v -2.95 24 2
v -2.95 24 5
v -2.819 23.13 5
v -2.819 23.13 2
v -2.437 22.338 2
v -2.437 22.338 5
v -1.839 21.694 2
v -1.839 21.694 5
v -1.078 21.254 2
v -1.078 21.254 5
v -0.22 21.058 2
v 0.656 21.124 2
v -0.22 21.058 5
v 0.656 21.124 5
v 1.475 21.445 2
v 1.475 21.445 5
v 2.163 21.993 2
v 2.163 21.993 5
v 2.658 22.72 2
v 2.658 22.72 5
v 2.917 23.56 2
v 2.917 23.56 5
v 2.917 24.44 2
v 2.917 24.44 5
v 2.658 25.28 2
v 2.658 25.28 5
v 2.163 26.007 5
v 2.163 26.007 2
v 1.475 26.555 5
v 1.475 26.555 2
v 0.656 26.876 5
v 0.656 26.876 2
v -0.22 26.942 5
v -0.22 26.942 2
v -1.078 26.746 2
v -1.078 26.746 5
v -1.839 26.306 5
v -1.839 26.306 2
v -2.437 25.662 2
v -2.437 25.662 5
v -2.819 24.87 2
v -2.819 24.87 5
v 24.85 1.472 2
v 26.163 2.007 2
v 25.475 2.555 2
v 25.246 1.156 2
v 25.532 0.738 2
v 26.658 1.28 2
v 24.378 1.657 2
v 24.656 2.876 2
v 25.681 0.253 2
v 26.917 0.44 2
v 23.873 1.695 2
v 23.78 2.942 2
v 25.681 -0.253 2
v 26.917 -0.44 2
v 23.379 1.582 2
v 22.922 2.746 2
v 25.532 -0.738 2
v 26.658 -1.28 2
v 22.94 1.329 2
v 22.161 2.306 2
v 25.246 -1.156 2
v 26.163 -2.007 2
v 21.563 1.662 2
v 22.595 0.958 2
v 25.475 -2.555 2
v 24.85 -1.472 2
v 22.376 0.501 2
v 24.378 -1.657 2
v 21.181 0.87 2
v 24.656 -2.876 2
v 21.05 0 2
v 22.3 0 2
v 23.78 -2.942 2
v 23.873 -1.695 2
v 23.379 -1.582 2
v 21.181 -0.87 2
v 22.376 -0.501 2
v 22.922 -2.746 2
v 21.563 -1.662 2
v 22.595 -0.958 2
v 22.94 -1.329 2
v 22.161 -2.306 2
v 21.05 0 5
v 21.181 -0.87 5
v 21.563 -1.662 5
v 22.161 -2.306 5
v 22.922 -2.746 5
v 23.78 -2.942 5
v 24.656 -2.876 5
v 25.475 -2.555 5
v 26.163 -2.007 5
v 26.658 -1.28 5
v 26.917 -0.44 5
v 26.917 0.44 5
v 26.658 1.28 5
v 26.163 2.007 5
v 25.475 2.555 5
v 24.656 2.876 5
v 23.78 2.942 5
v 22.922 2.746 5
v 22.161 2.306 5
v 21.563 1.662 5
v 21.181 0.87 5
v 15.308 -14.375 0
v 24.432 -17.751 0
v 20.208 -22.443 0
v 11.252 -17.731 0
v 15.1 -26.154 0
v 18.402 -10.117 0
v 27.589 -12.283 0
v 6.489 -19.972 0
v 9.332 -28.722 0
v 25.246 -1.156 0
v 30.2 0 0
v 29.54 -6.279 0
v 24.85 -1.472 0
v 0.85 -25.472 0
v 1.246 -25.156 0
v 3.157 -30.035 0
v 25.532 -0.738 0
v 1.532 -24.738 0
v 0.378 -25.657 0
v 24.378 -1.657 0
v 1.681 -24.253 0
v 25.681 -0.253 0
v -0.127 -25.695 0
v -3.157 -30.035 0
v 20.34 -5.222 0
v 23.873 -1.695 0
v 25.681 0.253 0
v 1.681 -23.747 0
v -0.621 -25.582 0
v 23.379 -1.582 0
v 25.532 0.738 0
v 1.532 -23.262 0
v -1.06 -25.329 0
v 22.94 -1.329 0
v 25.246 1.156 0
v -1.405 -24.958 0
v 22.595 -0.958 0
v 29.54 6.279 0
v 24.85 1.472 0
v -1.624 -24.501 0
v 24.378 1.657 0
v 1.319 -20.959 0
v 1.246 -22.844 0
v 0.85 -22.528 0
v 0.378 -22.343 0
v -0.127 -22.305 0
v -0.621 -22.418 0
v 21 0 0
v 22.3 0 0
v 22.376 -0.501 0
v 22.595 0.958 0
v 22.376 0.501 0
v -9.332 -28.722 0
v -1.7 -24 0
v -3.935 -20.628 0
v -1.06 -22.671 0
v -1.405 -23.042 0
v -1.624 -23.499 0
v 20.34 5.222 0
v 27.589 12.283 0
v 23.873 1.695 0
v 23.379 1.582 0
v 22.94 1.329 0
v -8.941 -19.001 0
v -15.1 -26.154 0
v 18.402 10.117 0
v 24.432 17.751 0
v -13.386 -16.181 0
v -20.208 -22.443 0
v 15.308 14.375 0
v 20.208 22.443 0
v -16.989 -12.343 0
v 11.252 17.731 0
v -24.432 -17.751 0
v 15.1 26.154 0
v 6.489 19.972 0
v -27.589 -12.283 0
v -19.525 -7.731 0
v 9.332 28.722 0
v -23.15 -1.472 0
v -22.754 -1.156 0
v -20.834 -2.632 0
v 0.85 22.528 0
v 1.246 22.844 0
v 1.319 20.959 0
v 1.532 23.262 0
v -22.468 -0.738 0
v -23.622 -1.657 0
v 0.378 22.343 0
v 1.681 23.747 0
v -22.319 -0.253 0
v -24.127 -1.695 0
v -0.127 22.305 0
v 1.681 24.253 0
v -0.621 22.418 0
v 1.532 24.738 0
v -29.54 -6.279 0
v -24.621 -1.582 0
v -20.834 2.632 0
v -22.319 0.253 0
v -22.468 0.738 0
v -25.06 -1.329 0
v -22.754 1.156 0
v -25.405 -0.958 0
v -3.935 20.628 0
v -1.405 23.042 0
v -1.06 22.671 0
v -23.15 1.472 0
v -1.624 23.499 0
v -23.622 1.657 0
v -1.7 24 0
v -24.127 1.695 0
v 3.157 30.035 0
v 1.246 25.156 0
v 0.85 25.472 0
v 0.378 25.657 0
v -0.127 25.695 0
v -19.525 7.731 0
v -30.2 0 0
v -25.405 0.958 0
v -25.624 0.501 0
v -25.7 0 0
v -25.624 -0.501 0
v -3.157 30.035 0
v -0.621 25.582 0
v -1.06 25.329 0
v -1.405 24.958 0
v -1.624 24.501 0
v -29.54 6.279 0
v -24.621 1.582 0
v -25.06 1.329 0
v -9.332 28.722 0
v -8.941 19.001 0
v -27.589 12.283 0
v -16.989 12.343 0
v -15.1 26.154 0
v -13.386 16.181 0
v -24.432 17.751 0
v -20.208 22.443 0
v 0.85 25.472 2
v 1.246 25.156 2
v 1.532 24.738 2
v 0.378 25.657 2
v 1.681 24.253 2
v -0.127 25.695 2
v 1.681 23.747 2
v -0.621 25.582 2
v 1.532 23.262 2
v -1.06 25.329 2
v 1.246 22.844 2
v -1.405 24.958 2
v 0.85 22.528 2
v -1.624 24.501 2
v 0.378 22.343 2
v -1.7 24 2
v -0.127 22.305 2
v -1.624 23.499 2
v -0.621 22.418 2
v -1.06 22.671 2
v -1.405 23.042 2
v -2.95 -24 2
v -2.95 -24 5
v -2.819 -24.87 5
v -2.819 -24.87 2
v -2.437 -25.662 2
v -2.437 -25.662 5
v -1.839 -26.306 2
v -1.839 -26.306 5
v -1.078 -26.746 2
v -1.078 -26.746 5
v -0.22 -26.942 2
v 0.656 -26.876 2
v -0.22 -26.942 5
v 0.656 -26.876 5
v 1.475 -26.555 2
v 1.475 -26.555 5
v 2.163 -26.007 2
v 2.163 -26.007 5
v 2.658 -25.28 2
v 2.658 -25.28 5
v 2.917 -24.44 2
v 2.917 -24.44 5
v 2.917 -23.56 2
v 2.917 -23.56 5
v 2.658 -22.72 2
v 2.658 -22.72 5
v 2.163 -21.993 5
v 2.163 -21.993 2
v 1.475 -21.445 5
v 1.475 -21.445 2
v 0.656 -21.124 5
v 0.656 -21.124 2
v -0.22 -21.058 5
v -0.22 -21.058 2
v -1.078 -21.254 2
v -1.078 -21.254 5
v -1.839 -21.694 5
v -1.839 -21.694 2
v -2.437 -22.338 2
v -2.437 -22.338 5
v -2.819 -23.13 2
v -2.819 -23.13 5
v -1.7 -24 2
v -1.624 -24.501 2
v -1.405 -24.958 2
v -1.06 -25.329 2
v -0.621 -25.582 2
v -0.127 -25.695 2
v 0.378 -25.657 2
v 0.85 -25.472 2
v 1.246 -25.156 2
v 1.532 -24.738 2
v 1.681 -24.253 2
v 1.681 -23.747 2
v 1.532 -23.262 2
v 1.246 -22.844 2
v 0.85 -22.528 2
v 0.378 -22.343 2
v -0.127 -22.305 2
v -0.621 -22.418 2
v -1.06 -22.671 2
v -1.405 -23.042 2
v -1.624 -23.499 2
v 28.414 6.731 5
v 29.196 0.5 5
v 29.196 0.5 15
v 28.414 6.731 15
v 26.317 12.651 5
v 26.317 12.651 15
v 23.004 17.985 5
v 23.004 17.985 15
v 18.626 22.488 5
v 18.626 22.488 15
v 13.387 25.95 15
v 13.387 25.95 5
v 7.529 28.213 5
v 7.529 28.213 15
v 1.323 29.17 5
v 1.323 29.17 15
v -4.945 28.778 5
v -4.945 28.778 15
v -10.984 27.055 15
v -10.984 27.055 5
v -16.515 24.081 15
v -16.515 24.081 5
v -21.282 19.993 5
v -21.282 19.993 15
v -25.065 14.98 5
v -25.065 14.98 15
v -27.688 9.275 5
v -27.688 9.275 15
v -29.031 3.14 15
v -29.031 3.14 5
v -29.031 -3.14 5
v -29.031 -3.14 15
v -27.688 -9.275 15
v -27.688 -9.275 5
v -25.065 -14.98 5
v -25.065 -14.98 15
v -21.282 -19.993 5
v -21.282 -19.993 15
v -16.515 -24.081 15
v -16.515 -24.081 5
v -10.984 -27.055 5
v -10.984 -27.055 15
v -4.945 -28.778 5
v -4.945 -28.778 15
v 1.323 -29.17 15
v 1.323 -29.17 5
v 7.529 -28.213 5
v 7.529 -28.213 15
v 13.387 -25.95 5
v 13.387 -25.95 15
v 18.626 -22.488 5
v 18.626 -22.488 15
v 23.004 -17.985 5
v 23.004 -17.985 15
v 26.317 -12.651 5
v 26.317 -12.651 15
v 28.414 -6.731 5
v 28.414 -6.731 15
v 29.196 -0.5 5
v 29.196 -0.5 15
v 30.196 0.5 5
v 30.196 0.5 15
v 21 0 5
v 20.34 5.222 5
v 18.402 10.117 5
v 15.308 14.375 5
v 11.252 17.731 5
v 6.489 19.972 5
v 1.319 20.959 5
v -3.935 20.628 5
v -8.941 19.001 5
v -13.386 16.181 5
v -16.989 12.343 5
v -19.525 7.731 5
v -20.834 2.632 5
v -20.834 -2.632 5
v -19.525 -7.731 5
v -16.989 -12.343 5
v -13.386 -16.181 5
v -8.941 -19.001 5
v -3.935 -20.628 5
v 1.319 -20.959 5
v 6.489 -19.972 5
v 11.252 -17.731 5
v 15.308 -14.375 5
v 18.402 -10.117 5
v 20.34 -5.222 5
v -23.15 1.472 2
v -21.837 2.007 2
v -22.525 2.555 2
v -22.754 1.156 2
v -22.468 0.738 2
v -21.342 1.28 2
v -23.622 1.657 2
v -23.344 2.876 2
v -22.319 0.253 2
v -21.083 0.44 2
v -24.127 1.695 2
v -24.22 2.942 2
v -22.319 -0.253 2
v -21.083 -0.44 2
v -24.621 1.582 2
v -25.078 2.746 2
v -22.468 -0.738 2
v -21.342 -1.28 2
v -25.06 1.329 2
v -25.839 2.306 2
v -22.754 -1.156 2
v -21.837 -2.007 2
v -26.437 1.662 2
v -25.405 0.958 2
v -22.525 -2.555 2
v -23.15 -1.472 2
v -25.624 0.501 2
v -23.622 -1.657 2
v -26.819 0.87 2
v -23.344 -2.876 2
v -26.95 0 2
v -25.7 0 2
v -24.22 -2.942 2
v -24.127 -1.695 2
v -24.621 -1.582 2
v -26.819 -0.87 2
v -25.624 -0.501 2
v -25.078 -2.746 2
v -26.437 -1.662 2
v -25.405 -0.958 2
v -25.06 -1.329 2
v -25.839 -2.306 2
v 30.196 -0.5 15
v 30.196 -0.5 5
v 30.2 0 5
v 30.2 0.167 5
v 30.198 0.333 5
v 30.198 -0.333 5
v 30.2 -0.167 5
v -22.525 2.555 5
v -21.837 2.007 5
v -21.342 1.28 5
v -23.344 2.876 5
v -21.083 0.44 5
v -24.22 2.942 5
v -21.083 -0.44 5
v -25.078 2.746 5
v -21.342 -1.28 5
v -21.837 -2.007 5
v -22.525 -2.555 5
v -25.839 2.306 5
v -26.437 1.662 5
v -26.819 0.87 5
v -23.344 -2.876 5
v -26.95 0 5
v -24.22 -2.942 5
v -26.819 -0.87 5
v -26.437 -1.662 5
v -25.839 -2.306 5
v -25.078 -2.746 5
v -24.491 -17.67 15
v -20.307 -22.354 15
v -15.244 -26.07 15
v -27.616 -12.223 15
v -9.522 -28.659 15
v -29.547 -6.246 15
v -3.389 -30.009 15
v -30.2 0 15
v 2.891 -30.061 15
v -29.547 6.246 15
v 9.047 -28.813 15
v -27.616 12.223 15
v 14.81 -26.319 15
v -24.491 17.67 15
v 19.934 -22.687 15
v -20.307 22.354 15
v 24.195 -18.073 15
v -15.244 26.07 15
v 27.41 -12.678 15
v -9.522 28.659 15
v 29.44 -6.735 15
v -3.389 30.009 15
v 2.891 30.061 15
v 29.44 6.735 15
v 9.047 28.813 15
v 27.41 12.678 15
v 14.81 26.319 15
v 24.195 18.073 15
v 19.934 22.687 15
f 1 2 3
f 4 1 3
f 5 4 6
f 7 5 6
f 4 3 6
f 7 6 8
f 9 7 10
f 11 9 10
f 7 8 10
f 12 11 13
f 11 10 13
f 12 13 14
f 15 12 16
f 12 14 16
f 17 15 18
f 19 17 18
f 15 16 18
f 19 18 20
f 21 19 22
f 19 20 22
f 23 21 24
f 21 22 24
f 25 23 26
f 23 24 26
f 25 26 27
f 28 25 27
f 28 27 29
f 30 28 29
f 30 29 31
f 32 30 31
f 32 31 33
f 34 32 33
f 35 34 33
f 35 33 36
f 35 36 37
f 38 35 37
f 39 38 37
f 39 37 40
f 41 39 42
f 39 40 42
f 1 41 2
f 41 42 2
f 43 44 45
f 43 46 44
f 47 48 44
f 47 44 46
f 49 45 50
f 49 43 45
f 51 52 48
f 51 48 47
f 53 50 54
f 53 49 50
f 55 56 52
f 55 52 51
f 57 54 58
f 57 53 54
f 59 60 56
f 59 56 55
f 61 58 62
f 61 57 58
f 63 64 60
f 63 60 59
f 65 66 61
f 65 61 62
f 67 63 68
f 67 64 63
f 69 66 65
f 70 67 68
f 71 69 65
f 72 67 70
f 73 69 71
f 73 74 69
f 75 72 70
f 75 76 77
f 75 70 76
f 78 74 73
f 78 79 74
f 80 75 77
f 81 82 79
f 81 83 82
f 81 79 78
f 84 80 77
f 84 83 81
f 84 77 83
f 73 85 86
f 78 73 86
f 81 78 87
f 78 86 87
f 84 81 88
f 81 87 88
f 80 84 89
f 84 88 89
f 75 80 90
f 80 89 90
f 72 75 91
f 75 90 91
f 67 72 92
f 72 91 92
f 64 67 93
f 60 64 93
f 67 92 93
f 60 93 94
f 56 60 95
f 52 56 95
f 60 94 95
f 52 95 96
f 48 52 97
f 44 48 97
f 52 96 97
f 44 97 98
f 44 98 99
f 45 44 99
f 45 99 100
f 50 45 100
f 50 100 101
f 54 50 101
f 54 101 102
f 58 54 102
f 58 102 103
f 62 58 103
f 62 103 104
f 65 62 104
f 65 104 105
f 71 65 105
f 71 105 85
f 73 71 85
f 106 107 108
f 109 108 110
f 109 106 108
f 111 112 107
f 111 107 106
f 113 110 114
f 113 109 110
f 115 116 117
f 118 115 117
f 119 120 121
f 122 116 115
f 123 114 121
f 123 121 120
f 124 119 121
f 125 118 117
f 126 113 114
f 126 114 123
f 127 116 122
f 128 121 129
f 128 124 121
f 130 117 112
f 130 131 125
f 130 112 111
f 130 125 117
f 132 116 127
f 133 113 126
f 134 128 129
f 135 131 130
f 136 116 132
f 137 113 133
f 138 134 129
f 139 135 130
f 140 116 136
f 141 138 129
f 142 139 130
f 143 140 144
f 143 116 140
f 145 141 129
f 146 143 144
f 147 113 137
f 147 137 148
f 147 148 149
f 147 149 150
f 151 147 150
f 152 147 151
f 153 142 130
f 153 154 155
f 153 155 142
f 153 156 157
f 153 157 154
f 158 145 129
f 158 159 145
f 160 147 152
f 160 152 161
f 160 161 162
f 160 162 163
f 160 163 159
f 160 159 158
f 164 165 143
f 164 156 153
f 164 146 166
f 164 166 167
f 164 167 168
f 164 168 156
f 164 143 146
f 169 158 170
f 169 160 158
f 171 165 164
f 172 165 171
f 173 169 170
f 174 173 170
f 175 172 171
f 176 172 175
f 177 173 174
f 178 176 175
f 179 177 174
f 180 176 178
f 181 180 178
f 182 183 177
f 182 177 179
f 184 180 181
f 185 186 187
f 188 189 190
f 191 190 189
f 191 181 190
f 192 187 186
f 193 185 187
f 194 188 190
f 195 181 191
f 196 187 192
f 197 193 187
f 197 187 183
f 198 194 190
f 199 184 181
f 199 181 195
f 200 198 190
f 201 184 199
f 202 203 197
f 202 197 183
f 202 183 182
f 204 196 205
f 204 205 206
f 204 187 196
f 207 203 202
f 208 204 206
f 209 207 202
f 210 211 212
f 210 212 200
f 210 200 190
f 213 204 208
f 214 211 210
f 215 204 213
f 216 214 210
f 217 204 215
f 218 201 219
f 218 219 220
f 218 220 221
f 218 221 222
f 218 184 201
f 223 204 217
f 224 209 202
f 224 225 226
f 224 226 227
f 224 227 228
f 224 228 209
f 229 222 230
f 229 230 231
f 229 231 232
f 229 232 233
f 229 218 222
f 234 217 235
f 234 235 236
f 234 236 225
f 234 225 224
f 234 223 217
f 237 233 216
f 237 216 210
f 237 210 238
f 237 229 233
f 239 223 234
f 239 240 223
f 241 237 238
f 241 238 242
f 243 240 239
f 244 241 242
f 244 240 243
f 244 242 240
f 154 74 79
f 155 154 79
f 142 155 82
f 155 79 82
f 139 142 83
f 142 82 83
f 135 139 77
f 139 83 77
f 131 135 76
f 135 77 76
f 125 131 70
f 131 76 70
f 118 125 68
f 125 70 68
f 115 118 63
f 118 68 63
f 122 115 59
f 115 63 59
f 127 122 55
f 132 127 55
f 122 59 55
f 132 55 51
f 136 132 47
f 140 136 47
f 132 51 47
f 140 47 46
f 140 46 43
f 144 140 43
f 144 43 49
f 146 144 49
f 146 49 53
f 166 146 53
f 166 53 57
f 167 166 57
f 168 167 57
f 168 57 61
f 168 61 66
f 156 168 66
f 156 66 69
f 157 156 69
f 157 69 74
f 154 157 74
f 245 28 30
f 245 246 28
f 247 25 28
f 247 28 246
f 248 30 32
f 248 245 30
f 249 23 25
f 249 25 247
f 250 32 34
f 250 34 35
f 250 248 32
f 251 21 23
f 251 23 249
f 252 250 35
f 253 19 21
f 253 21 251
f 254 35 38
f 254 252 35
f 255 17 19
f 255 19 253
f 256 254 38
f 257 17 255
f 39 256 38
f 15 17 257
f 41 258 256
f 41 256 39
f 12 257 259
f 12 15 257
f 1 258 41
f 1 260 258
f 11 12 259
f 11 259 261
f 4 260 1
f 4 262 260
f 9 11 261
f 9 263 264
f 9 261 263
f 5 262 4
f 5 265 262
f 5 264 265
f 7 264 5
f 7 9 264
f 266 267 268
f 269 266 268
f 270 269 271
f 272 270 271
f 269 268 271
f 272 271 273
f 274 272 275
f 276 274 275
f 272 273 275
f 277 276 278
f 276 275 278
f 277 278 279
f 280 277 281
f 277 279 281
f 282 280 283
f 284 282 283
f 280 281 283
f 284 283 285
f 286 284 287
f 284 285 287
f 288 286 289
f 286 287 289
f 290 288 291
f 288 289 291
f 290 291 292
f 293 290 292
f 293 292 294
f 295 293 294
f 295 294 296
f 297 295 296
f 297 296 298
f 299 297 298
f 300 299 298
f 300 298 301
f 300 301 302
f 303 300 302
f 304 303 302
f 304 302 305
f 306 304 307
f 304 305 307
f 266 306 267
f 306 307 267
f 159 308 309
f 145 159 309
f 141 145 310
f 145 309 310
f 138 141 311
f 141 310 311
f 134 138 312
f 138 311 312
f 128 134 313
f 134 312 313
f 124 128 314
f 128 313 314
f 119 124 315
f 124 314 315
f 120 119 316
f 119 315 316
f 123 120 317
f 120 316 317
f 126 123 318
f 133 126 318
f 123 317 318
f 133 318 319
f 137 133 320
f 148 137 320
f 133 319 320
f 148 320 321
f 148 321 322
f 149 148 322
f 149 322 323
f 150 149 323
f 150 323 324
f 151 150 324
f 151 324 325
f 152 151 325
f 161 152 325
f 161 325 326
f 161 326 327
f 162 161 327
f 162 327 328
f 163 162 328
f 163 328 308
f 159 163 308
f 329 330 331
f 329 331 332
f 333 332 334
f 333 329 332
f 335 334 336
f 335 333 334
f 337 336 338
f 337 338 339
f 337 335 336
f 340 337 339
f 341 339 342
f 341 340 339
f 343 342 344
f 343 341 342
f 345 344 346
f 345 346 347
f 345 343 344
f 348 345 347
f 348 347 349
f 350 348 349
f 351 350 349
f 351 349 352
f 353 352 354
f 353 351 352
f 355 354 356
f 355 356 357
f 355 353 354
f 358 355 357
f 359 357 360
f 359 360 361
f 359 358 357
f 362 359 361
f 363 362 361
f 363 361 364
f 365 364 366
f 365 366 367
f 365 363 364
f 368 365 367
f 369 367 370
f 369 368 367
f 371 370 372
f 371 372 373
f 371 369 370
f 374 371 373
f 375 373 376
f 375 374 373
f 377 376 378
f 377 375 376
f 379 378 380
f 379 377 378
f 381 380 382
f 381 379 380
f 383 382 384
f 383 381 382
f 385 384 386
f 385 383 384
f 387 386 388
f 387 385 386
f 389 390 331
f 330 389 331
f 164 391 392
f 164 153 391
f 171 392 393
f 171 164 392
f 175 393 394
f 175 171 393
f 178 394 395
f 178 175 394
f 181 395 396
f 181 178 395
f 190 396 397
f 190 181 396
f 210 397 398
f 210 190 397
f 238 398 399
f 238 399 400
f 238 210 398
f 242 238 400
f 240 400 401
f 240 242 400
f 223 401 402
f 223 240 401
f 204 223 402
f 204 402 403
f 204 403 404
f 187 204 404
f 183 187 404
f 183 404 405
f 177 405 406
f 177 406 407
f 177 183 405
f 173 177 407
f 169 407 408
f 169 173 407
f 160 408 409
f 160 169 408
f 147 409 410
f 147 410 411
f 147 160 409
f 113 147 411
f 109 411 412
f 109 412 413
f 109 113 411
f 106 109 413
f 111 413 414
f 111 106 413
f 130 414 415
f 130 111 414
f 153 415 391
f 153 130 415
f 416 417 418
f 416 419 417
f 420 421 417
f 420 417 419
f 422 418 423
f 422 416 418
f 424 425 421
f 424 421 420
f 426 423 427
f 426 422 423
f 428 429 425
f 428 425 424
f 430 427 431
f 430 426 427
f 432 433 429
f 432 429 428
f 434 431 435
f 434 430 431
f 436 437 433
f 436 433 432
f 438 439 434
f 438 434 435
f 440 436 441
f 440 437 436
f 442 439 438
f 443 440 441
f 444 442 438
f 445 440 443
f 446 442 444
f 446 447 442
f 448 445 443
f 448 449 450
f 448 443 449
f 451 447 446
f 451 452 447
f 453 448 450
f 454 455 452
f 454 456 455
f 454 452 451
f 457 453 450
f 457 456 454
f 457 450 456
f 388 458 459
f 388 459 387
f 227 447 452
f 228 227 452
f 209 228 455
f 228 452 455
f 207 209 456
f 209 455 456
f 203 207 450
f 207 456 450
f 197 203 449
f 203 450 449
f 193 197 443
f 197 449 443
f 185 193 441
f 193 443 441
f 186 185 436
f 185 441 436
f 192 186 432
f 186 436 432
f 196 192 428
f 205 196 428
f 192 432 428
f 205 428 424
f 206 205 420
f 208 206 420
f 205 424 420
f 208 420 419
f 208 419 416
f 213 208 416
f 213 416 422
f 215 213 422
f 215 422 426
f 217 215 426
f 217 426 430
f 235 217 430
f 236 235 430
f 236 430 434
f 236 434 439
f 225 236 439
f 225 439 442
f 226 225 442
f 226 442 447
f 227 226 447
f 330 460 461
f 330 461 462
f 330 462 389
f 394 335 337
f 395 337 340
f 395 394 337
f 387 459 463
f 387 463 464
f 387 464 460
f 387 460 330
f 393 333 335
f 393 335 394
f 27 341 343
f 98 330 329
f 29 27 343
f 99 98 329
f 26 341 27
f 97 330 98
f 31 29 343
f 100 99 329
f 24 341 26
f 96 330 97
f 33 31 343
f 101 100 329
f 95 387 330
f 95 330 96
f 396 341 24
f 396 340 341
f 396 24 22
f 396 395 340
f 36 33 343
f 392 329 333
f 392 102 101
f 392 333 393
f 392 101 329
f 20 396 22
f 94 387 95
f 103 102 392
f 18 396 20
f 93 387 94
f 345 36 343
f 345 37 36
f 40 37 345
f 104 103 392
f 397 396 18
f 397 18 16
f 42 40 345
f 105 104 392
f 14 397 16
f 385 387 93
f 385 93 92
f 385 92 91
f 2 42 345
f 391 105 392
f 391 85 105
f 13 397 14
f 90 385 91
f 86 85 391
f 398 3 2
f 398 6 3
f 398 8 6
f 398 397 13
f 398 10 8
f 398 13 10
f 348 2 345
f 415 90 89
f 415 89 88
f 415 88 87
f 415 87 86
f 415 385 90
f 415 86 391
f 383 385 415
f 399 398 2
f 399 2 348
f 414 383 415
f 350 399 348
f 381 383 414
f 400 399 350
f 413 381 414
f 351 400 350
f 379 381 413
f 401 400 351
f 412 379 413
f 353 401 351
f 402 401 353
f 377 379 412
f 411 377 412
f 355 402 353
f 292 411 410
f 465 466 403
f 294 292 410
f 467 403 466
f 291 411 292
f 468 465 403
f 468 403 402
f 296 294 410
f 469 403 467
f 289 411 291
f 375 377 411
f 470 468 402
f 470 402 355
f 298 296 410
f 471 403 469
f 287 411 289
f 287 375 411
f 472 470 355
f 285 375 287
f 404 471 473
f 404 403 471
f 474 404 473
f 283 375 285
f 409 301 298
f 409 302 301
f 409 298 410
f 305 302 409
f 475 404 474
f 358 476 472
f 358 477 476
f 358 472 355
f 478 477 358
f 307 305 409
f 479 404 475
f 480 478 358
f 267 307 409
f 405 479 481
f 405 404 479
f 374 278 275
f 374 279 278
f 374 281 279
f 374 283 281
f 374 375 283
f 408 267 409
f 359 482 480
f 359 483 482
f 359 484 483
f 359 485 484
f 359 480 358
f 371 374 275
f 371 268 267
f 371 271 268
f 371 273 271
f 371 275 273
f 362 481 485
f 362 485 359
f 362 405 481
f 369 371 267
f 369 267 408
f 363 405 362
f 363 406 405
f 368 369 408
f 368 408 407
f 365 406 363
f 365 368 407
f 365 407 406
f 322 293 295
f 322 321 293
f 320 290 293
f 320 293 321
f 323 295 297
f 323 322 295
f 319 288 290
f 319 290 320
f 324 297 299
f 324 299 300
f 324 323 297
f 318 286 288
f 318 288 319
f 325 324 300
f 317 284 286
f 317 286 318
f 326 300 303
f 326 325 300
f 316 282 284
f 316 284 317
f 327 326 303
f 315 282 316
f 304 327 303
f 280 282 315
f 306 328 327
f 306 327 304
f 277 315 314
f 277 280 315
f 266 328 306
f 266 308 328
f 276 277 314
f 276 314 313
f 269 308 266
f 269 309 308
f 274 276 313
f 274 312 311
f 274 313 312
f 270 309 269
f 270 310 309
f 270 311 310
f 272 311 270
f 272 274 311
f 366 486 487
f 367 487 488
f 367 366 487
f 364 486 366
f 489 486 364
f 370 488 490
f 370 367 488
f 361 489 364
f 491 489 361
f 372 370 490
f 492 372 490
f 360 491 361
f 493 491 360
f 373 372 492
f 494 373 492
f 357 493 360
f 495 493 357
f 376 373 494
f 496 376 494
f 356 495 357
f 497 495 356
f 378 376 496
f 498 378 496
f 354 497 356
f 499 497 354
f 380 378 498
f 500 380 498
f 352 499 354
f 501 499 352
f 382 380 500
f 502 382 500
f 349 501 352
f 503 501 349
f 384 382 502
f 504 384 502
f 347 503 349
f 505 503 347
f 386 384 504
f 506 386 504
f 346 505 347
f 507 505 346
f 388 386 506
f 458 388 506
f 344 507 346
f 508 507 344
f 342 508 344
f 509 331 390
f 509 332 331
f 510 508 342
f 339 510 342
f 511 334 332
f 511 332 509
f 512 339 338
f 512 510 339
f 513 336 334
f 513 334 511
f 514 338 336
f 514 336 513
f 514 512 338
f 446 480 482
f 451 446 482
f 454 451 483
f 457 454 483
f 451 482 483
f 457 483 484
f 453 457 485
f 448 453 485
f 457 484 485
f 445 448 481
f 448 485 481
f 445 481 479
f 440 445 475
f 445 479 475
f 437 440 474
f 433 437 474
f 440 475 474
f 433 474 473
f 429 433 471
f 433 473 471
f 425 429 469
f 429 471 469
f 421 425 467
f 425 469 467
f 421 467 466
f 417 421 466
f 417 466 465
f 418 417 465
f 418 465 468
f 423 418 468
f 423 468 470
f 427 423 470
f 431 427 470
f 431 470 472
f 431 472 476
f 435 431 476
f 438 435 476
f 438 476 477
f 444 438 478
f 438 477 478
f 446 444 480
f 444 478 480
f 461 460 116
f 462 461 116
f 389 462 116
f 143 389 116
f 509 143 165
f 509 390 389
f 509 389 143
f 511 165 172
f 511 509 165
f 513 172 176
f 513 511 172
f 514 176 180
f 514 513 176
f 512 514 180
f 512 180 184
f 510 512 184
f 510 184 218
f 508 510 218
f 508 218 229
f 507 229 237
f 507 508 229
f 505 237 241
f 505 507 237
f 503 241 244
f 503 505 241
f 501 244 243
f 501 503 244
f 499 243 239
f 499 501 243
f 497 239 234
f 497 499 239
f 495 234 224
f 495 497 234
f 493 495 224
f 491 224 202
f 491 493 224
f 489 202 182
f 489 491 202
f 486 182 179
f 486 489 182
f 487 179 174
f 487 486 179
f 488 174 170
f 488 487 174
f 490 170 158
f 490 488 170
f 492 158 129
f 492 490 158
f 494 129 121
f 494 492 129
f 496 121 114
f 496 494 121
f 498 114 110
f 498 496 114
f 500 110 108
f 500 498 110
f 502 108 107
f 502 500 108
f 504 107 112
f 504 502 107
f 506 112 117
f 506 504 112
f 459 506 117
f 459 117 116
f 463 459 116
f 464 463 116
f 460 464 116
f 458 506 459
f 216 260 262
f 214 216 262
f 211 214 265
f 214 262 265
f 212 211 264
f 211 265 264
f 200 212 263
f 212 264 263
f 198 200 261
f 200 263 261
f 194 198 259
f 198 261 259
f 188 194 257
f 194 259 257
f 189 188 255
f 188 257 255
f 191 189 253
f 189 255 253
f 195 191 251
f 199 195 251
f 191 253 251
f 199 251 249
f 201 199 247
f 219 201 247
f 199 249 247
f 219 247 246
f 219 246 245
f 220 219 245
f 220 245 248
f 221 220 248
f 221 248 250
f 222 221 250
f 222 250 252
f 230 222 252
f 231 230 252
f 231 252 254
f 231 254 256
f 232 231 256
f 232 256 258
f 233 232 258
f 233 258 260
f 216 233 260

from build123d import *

# Parameters (mm, degrees)
SKETCH001_R     = 1.7
POCKET_DEPTH    = 5.001
SKETCH002_R     = 2.95
POCKET001_DEPTH = 3
SKETCH003_W     = 10
SKETCH003_H     = 1
POCKET002_DEPTH = 10


with BuildPart() as part:
    # Sketch → Revolution (revolve)
    with BuildSketch(Plane.XZ):
        Polygon((30.2, 0), (30.2, 15), (29.2, 15), (29.2, 5), (21, 5), (21, 0), align=None)
    revolve(axis=Axis((0, 0, 0), (0, 0, 1)))

    # Sketch001 (on Face4 of Revolution) → Pocket (cut, through all)
    with BuildSketch(Plane(origin=(0, 0, 5), x_dir=(-1, 0, 0), z_dir=(0, 0, 1))):
        with Locations((24, 0)):
            Circle(SKETCH001_R)
        with Locations((0, 24)):
            Circle(SKETCH001_R)
        with Locations((-24, 0)):
            Circle(SKETCH001_R)
        with Locations((0, -24)):
            Circle(SKETCH001_R)
    extrude(amount=-POCKET_DEPTH, mode=Mode.SUBTRACT)

    # Sketch002 (on Face10 of Pocket) → Pocket001 (cut)
    with BuildSketch(Plane(origin=(0, 0, 5), x_dir=(-1, 0, 0), z_dir=(0, 0, 1))):
        with Locations((0, 24)):
            Circle(SKETCH002_R)
        with Locations((-24, 0)):
            Circle(SKETCH002_R)
        with Locations((0, -24)):
            Circle(SKETCH002_R)
        with Locations((24, 0)):
            Circle(SKETCH002_R)
    extrude(amount=-POCKET001_DEPTH, mode=Mode.SUBTRACT)

    # Sketch003 (on Face3 of Pocket001) → Pocket002 (cut)
    with BuildSketch(Plane(origin=(0, 0, 15), x_dir=(-1, 0, 0), z_dir=(0, 0, 1))):
        with Locations((-30, 0)):
            Rectangle(SKETCH003_W, SKETCH003_H)
    extrude(amount=-POCKET002_DEPTH, mode=Mode.SUBTRACT)


solid = part.part
